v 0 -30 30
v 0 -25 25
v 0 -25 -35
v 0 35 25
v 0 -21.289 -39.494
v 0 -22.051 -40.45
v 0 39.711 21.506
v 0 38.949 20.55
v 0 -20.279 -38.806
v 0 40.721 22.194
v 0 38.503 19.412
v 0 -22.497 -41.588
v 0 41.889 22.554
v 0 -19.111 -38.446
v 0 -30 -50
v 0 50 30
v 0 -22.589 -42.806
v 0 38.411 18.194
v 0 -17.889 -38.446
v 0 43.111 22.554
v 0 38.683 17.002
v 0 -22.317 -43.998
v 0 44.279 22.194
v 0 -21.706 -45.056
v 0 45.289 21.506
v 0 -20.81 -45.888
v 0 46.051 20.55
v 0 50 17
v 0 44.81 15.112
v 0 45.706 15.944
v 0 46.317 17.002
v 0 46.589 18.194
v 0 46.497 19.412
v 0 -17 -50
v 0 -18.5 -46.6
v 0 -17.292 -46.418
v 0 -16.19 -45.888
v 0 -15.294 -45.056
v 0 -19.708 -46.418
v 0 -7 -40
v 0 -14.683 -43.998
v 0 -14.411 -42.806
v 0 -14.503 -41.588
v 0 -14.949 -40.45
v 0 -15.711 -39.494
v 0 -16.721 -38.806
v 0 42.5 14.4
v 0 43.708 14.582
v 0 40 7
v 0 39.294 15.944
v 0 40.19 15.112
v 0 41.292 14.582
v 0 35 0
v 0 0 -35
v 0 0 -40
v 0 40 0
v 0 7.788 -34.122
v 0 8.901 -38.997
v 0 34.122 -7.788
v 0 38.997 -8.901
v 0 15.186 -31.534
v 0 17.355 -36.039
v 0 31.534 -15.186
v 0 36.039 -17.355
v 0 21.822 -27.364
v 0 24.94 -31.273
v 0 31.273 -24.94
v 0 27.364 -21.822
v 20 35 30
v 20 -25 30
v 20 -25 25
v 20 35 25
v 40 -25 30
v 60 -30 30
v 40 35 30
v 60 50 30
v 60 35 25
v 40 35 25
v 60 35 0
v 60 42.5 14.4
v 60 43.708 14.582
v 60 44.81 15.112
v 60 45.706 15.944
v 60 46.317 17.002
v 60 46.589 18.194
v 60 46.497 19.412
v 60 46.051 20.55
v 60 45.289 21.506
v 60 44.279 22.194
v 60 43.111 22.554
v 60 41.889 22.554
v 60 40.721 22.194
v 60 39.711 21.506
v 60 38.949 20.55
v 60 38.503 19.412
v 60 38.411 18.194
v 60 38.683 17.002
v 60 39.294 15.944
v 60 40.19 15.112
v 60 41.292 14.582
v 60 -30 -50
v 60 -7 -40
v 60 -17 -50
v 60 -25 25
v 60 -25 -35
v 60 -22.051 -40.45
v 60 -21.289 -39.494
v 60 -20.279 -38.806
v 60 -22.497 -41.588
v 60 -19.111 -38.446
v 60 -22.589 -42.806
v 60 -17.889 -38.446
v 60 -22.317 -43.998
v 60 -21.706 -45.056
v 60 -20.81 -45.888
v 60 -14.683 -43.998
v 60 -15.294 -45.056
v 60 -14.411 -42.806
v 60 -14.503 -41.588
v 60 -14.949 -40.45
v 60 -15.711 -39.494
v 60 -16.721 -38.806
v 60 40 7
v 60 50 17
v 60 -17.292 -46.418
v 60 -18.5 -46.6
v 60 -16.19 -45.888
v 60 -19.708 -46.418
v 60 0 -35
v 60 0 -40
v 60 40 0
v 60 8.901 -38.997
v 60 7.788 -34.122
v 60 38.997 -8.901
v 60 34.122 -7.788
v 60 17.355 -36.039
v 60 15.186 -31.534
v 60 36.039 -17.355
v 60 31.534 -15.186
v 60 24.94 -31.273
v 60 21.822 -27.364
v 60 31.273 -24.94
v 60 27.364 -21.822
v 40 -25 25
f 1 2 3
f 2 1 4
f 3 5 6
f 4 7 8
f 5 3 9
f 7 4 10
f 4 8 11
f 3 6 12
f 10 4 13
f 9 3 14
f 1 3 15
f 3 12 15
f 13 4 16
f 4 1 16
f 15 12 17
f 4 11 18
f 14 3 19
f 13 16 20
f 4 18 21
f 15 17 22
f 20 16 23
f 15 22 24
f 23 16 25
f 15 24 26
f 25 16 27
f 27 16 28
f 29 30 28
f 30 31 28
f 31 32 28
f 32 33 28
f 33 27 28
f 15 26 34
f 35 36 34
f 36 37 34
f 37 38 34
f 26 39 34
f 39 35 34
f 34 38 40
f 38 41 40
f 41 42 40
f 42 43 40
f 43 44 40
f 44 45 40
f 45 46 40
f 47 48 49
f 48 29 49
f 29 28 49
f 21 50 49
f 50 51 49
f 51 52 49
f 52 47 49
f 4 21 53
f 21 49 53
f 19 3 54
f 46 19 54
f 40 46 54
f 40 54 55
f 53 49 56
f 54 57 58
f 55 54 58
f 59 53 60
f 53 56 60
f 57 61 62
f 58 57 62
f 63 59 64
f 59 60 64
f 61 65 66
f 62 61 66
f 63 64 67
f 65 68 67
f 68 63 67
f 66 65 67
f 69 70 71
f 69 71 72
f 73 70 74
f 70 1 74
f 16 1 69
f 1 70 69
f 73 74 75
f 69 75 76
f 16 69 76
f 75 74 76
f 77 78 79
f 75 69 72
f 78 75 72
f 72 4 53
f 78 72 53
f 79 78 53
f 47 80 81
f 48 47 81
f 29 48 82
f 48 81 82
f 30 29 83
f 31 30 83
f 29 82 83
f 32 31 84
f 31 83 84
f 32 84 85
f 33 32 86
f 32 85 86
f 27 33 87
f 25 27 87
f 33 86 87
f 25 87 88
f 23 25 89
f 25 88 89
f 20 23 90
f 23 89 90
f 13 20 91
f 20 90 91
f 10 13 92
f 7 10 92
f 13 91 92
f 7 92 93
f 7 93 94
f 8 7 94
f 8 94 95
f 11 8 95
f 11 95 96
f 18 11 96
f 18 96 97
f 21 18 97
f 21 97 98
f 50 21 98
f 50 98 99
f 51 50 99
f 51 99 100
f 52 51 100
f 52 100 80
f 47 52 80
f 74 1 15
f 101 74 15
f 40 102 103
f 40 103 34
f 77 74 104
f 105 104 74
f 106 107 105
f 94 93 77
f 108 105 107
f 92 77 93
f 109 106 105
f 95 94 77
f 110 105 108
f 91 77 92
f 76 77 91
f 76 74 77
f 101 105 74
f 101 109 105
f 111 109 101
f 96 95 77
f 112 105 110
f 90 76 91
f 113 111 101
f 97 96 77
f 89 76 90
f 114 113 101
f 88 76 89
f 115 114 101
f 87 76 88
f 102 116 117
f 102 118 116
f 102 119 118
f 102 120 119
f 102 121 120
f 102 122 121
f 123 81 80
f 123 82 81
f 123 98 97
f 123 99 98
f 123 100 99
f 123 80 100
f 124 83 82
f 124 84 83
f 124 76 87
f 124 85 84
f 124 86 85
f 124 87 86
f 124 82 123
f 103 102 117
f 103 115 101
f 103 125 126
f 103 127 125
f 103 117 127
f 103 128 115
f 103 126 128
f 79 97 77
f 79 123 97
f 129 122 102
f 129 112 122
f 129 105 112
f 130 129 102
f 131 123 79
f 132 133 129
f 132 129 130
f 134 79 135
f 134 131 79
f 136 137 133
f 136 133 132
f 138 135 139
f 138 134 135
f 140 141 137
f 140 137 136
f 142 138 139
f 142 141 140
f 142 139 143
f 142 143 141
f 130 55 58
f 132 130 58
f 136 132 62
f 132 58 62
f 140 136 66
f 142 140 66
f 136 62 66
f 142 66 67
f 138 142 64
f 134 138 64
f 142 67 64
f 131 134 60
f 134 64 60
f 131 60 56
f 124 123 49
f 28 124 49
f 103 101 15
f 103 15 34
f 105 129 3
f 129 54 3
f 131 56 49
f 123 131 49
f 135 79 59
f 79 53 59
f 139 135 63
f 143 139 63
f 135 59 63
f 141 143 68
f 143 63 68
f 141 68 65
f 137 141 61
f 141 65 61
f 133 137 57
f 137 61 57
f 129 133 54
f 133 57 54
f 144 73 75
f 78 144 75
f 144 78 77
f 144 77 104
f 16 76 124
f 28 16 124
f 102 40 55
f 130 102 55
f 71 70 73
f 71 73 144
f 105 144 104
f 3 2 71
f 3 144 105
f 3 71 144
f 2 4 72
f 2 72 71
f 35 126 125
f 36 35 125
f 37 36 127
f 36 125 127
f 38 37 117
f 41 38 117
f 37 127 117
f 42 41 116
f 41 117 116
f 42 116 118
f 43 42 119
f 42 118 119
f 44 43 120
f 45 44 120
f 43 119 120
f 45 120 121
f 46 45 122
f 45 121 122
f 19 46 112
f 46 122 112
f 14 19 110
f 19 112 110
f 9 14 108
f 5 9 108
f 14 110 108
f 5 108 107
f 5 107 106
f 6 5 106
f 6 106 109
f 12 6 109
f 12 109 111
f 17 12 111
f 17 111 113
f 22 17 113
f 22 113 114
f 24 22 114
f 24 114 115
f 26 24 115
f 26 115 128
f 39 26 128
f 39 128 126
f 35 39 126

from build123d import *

# Parameters (mm, degrees)
BOSS_EXTRUDE1_DEPTH = 60
CUT_EXTRUDE1_DEPTH  = 7
CUT_EXTRUDE2_REACH  = 72
SKETCH5_W           = 20
SKETCH5_H           = 60
SKETCH6_W           = 23
SKETCH6_H           = 10
SKETCH6_W_2         = 10
SKETCH6_H_2         = 23
BOSS_EXTRUDE3_DEPTH = 60
SKETCH8_R           = 4.1
CUT_EXTRUDE3_DEPTH  = 61
CHAMFER2_SIZE       = 10
BOSS_EXTRUDE4_DEPTH = 7


with BuildPart() as part:
    # Sketch2 → Boss-Extrude1 (new body)
    with BuildSketch(Plane(origin=(0, 0, 0), x_dir=(0, 0, -1), z_dir=(1, 0, 0))):
        with BuildLine():
            Line((0, 40), (-30, 40))
            Line((-30, 40), (-30, -30))
            Line((-30, -30), (40, -30))
            Line((40, -30), (40, 0))
            ThreePointArc((40, 0), (28.284271247, 28.284271247), (0, 40))
        make_face()
        with BuildLine():
            Line((-25, 35), (-25, -25))
            Line((-25, -25), (35, -25))
            Line((35, -25), (35, 0))
            ThreePointArc((35, 0), (24.748737342, 24.748737342), (0, 35))
            Line((0, 35), (-25, 35))
        make_face(mode=Mode.SUBTRACT)
    extrude(amount=BOSS_EXTRUDE1_DEPTH)

    # Sketch4 → Cut-Extrude1 (cut)
    with BuildSketch(Plane(origin=(60, 0, 0), x_dir=(0, 0, -1), z_dir=(1, 0, 0))):
        with BuildLine():
            Line((0, 40), (-7, 40))
            Line((-7, 40), (-7, 35))
            Line((-7, 35), (0, 35))
            ThreePointArc((0, 35), (24.748737342, 24.748737342), (35, 0))
            Line((35, 0), (35, -7))
            Line((35, -7), (40, -7))
            Line((40, -7), (40, 0))
            ThreePointArc((40, 0), (28.284271247, 28.284271247), (0, 40))
        make_face()
    extrude(amount=-CUT_EXTRUDE1_DEPTH, mode=Mode.SUBTRACT)

    # Sketch5 → Cut-Extrude2 (cut, up to next)
    with BuildSketch(Plane.XY.offset(30), mode=Mode.PRIVATE) as cut_extrude2_sk1:
        with Locations((30, 5)):
            Rectangle(SKETCH5_W, SKETCH5_H)
    cut_extrude2_tool1 = extrude(cut_extrude2_sk1.sketch, amount=-CUT_EXTRUDE2_REACH, mode=Mode.PRIVATE) & part.part
    add(cut_extrude2_tool1.solids().sort_by_distance((30, 5, 30))[0], mode=Mode.SUBTRACT)

    # Sketch6 → Boss-Extrude3 (add)
    with BuildSketch(Plane(origin=(60, 0, 0), x_dir=(0, 0, -1), z_dir=(1, 0, 0))):
        with Locations((-18.5, 45)):
            Rectangle(SKETCH6_W, SKETCH6_H)
        with Locations((45, -18.5)):
            Rectangle(SKETCH6_W_2, SKETCH6_H_2)
    extrude(amount=-BOSS_EXTRUDE3_DEPTH)

    # Sketch8 → Cut-Extrude3 (cut, through all)
    with BuildSketch(Plane(origin=(60, 0, 0), x_dir=(0, 0, -1), z_dir=(1, 0, 0))):
        with Locations((-18.5, 42.5)):
            Circle(SKETCH8_R)
        with Locations((42.5, -18.5)):
            Circle(SKETCH8_R)
    extrude(amount=-CUT_EXTRUDE3_DEPTH, mode=Mode.SUBTRACT)

    # Chamfer2
    chamfer2_edges = [part.edges().sort_by_distance(p)[0] for p in [
        (30, -7, -50),
        (30, 50, 7),
    ]]
    chamfer(chamfer2_edges, length=CHAMFER2_SIZE)

    # Sketch9 → Boss-Extrude4 (add)
    with BuildSketch(Plane(origin=(53, 0, 0), x_dir=(0, 0, -1), z_dir=(1, 0, 0))):
        with BuildLine():
            Line((0, 40), (-7, 40))
            Line((-7, 40), (-7, 35))
            Line((-7, 35), (0, 35))
            ThreePointArc((0, 35), (24.748737342, 24.748737342), (35, 0))
            Line((35, 0), (35, -7))
            Line((35, -7), (40, -7))
            Line((40, -7), (40, 0))
            ThreePointArc((40, 0), (28.284271247, 28.284271247), (0, 40))
        make_face()
    extrude(amount=BOSS_EXTRUDE4_DEPTH)


solid = part.part
